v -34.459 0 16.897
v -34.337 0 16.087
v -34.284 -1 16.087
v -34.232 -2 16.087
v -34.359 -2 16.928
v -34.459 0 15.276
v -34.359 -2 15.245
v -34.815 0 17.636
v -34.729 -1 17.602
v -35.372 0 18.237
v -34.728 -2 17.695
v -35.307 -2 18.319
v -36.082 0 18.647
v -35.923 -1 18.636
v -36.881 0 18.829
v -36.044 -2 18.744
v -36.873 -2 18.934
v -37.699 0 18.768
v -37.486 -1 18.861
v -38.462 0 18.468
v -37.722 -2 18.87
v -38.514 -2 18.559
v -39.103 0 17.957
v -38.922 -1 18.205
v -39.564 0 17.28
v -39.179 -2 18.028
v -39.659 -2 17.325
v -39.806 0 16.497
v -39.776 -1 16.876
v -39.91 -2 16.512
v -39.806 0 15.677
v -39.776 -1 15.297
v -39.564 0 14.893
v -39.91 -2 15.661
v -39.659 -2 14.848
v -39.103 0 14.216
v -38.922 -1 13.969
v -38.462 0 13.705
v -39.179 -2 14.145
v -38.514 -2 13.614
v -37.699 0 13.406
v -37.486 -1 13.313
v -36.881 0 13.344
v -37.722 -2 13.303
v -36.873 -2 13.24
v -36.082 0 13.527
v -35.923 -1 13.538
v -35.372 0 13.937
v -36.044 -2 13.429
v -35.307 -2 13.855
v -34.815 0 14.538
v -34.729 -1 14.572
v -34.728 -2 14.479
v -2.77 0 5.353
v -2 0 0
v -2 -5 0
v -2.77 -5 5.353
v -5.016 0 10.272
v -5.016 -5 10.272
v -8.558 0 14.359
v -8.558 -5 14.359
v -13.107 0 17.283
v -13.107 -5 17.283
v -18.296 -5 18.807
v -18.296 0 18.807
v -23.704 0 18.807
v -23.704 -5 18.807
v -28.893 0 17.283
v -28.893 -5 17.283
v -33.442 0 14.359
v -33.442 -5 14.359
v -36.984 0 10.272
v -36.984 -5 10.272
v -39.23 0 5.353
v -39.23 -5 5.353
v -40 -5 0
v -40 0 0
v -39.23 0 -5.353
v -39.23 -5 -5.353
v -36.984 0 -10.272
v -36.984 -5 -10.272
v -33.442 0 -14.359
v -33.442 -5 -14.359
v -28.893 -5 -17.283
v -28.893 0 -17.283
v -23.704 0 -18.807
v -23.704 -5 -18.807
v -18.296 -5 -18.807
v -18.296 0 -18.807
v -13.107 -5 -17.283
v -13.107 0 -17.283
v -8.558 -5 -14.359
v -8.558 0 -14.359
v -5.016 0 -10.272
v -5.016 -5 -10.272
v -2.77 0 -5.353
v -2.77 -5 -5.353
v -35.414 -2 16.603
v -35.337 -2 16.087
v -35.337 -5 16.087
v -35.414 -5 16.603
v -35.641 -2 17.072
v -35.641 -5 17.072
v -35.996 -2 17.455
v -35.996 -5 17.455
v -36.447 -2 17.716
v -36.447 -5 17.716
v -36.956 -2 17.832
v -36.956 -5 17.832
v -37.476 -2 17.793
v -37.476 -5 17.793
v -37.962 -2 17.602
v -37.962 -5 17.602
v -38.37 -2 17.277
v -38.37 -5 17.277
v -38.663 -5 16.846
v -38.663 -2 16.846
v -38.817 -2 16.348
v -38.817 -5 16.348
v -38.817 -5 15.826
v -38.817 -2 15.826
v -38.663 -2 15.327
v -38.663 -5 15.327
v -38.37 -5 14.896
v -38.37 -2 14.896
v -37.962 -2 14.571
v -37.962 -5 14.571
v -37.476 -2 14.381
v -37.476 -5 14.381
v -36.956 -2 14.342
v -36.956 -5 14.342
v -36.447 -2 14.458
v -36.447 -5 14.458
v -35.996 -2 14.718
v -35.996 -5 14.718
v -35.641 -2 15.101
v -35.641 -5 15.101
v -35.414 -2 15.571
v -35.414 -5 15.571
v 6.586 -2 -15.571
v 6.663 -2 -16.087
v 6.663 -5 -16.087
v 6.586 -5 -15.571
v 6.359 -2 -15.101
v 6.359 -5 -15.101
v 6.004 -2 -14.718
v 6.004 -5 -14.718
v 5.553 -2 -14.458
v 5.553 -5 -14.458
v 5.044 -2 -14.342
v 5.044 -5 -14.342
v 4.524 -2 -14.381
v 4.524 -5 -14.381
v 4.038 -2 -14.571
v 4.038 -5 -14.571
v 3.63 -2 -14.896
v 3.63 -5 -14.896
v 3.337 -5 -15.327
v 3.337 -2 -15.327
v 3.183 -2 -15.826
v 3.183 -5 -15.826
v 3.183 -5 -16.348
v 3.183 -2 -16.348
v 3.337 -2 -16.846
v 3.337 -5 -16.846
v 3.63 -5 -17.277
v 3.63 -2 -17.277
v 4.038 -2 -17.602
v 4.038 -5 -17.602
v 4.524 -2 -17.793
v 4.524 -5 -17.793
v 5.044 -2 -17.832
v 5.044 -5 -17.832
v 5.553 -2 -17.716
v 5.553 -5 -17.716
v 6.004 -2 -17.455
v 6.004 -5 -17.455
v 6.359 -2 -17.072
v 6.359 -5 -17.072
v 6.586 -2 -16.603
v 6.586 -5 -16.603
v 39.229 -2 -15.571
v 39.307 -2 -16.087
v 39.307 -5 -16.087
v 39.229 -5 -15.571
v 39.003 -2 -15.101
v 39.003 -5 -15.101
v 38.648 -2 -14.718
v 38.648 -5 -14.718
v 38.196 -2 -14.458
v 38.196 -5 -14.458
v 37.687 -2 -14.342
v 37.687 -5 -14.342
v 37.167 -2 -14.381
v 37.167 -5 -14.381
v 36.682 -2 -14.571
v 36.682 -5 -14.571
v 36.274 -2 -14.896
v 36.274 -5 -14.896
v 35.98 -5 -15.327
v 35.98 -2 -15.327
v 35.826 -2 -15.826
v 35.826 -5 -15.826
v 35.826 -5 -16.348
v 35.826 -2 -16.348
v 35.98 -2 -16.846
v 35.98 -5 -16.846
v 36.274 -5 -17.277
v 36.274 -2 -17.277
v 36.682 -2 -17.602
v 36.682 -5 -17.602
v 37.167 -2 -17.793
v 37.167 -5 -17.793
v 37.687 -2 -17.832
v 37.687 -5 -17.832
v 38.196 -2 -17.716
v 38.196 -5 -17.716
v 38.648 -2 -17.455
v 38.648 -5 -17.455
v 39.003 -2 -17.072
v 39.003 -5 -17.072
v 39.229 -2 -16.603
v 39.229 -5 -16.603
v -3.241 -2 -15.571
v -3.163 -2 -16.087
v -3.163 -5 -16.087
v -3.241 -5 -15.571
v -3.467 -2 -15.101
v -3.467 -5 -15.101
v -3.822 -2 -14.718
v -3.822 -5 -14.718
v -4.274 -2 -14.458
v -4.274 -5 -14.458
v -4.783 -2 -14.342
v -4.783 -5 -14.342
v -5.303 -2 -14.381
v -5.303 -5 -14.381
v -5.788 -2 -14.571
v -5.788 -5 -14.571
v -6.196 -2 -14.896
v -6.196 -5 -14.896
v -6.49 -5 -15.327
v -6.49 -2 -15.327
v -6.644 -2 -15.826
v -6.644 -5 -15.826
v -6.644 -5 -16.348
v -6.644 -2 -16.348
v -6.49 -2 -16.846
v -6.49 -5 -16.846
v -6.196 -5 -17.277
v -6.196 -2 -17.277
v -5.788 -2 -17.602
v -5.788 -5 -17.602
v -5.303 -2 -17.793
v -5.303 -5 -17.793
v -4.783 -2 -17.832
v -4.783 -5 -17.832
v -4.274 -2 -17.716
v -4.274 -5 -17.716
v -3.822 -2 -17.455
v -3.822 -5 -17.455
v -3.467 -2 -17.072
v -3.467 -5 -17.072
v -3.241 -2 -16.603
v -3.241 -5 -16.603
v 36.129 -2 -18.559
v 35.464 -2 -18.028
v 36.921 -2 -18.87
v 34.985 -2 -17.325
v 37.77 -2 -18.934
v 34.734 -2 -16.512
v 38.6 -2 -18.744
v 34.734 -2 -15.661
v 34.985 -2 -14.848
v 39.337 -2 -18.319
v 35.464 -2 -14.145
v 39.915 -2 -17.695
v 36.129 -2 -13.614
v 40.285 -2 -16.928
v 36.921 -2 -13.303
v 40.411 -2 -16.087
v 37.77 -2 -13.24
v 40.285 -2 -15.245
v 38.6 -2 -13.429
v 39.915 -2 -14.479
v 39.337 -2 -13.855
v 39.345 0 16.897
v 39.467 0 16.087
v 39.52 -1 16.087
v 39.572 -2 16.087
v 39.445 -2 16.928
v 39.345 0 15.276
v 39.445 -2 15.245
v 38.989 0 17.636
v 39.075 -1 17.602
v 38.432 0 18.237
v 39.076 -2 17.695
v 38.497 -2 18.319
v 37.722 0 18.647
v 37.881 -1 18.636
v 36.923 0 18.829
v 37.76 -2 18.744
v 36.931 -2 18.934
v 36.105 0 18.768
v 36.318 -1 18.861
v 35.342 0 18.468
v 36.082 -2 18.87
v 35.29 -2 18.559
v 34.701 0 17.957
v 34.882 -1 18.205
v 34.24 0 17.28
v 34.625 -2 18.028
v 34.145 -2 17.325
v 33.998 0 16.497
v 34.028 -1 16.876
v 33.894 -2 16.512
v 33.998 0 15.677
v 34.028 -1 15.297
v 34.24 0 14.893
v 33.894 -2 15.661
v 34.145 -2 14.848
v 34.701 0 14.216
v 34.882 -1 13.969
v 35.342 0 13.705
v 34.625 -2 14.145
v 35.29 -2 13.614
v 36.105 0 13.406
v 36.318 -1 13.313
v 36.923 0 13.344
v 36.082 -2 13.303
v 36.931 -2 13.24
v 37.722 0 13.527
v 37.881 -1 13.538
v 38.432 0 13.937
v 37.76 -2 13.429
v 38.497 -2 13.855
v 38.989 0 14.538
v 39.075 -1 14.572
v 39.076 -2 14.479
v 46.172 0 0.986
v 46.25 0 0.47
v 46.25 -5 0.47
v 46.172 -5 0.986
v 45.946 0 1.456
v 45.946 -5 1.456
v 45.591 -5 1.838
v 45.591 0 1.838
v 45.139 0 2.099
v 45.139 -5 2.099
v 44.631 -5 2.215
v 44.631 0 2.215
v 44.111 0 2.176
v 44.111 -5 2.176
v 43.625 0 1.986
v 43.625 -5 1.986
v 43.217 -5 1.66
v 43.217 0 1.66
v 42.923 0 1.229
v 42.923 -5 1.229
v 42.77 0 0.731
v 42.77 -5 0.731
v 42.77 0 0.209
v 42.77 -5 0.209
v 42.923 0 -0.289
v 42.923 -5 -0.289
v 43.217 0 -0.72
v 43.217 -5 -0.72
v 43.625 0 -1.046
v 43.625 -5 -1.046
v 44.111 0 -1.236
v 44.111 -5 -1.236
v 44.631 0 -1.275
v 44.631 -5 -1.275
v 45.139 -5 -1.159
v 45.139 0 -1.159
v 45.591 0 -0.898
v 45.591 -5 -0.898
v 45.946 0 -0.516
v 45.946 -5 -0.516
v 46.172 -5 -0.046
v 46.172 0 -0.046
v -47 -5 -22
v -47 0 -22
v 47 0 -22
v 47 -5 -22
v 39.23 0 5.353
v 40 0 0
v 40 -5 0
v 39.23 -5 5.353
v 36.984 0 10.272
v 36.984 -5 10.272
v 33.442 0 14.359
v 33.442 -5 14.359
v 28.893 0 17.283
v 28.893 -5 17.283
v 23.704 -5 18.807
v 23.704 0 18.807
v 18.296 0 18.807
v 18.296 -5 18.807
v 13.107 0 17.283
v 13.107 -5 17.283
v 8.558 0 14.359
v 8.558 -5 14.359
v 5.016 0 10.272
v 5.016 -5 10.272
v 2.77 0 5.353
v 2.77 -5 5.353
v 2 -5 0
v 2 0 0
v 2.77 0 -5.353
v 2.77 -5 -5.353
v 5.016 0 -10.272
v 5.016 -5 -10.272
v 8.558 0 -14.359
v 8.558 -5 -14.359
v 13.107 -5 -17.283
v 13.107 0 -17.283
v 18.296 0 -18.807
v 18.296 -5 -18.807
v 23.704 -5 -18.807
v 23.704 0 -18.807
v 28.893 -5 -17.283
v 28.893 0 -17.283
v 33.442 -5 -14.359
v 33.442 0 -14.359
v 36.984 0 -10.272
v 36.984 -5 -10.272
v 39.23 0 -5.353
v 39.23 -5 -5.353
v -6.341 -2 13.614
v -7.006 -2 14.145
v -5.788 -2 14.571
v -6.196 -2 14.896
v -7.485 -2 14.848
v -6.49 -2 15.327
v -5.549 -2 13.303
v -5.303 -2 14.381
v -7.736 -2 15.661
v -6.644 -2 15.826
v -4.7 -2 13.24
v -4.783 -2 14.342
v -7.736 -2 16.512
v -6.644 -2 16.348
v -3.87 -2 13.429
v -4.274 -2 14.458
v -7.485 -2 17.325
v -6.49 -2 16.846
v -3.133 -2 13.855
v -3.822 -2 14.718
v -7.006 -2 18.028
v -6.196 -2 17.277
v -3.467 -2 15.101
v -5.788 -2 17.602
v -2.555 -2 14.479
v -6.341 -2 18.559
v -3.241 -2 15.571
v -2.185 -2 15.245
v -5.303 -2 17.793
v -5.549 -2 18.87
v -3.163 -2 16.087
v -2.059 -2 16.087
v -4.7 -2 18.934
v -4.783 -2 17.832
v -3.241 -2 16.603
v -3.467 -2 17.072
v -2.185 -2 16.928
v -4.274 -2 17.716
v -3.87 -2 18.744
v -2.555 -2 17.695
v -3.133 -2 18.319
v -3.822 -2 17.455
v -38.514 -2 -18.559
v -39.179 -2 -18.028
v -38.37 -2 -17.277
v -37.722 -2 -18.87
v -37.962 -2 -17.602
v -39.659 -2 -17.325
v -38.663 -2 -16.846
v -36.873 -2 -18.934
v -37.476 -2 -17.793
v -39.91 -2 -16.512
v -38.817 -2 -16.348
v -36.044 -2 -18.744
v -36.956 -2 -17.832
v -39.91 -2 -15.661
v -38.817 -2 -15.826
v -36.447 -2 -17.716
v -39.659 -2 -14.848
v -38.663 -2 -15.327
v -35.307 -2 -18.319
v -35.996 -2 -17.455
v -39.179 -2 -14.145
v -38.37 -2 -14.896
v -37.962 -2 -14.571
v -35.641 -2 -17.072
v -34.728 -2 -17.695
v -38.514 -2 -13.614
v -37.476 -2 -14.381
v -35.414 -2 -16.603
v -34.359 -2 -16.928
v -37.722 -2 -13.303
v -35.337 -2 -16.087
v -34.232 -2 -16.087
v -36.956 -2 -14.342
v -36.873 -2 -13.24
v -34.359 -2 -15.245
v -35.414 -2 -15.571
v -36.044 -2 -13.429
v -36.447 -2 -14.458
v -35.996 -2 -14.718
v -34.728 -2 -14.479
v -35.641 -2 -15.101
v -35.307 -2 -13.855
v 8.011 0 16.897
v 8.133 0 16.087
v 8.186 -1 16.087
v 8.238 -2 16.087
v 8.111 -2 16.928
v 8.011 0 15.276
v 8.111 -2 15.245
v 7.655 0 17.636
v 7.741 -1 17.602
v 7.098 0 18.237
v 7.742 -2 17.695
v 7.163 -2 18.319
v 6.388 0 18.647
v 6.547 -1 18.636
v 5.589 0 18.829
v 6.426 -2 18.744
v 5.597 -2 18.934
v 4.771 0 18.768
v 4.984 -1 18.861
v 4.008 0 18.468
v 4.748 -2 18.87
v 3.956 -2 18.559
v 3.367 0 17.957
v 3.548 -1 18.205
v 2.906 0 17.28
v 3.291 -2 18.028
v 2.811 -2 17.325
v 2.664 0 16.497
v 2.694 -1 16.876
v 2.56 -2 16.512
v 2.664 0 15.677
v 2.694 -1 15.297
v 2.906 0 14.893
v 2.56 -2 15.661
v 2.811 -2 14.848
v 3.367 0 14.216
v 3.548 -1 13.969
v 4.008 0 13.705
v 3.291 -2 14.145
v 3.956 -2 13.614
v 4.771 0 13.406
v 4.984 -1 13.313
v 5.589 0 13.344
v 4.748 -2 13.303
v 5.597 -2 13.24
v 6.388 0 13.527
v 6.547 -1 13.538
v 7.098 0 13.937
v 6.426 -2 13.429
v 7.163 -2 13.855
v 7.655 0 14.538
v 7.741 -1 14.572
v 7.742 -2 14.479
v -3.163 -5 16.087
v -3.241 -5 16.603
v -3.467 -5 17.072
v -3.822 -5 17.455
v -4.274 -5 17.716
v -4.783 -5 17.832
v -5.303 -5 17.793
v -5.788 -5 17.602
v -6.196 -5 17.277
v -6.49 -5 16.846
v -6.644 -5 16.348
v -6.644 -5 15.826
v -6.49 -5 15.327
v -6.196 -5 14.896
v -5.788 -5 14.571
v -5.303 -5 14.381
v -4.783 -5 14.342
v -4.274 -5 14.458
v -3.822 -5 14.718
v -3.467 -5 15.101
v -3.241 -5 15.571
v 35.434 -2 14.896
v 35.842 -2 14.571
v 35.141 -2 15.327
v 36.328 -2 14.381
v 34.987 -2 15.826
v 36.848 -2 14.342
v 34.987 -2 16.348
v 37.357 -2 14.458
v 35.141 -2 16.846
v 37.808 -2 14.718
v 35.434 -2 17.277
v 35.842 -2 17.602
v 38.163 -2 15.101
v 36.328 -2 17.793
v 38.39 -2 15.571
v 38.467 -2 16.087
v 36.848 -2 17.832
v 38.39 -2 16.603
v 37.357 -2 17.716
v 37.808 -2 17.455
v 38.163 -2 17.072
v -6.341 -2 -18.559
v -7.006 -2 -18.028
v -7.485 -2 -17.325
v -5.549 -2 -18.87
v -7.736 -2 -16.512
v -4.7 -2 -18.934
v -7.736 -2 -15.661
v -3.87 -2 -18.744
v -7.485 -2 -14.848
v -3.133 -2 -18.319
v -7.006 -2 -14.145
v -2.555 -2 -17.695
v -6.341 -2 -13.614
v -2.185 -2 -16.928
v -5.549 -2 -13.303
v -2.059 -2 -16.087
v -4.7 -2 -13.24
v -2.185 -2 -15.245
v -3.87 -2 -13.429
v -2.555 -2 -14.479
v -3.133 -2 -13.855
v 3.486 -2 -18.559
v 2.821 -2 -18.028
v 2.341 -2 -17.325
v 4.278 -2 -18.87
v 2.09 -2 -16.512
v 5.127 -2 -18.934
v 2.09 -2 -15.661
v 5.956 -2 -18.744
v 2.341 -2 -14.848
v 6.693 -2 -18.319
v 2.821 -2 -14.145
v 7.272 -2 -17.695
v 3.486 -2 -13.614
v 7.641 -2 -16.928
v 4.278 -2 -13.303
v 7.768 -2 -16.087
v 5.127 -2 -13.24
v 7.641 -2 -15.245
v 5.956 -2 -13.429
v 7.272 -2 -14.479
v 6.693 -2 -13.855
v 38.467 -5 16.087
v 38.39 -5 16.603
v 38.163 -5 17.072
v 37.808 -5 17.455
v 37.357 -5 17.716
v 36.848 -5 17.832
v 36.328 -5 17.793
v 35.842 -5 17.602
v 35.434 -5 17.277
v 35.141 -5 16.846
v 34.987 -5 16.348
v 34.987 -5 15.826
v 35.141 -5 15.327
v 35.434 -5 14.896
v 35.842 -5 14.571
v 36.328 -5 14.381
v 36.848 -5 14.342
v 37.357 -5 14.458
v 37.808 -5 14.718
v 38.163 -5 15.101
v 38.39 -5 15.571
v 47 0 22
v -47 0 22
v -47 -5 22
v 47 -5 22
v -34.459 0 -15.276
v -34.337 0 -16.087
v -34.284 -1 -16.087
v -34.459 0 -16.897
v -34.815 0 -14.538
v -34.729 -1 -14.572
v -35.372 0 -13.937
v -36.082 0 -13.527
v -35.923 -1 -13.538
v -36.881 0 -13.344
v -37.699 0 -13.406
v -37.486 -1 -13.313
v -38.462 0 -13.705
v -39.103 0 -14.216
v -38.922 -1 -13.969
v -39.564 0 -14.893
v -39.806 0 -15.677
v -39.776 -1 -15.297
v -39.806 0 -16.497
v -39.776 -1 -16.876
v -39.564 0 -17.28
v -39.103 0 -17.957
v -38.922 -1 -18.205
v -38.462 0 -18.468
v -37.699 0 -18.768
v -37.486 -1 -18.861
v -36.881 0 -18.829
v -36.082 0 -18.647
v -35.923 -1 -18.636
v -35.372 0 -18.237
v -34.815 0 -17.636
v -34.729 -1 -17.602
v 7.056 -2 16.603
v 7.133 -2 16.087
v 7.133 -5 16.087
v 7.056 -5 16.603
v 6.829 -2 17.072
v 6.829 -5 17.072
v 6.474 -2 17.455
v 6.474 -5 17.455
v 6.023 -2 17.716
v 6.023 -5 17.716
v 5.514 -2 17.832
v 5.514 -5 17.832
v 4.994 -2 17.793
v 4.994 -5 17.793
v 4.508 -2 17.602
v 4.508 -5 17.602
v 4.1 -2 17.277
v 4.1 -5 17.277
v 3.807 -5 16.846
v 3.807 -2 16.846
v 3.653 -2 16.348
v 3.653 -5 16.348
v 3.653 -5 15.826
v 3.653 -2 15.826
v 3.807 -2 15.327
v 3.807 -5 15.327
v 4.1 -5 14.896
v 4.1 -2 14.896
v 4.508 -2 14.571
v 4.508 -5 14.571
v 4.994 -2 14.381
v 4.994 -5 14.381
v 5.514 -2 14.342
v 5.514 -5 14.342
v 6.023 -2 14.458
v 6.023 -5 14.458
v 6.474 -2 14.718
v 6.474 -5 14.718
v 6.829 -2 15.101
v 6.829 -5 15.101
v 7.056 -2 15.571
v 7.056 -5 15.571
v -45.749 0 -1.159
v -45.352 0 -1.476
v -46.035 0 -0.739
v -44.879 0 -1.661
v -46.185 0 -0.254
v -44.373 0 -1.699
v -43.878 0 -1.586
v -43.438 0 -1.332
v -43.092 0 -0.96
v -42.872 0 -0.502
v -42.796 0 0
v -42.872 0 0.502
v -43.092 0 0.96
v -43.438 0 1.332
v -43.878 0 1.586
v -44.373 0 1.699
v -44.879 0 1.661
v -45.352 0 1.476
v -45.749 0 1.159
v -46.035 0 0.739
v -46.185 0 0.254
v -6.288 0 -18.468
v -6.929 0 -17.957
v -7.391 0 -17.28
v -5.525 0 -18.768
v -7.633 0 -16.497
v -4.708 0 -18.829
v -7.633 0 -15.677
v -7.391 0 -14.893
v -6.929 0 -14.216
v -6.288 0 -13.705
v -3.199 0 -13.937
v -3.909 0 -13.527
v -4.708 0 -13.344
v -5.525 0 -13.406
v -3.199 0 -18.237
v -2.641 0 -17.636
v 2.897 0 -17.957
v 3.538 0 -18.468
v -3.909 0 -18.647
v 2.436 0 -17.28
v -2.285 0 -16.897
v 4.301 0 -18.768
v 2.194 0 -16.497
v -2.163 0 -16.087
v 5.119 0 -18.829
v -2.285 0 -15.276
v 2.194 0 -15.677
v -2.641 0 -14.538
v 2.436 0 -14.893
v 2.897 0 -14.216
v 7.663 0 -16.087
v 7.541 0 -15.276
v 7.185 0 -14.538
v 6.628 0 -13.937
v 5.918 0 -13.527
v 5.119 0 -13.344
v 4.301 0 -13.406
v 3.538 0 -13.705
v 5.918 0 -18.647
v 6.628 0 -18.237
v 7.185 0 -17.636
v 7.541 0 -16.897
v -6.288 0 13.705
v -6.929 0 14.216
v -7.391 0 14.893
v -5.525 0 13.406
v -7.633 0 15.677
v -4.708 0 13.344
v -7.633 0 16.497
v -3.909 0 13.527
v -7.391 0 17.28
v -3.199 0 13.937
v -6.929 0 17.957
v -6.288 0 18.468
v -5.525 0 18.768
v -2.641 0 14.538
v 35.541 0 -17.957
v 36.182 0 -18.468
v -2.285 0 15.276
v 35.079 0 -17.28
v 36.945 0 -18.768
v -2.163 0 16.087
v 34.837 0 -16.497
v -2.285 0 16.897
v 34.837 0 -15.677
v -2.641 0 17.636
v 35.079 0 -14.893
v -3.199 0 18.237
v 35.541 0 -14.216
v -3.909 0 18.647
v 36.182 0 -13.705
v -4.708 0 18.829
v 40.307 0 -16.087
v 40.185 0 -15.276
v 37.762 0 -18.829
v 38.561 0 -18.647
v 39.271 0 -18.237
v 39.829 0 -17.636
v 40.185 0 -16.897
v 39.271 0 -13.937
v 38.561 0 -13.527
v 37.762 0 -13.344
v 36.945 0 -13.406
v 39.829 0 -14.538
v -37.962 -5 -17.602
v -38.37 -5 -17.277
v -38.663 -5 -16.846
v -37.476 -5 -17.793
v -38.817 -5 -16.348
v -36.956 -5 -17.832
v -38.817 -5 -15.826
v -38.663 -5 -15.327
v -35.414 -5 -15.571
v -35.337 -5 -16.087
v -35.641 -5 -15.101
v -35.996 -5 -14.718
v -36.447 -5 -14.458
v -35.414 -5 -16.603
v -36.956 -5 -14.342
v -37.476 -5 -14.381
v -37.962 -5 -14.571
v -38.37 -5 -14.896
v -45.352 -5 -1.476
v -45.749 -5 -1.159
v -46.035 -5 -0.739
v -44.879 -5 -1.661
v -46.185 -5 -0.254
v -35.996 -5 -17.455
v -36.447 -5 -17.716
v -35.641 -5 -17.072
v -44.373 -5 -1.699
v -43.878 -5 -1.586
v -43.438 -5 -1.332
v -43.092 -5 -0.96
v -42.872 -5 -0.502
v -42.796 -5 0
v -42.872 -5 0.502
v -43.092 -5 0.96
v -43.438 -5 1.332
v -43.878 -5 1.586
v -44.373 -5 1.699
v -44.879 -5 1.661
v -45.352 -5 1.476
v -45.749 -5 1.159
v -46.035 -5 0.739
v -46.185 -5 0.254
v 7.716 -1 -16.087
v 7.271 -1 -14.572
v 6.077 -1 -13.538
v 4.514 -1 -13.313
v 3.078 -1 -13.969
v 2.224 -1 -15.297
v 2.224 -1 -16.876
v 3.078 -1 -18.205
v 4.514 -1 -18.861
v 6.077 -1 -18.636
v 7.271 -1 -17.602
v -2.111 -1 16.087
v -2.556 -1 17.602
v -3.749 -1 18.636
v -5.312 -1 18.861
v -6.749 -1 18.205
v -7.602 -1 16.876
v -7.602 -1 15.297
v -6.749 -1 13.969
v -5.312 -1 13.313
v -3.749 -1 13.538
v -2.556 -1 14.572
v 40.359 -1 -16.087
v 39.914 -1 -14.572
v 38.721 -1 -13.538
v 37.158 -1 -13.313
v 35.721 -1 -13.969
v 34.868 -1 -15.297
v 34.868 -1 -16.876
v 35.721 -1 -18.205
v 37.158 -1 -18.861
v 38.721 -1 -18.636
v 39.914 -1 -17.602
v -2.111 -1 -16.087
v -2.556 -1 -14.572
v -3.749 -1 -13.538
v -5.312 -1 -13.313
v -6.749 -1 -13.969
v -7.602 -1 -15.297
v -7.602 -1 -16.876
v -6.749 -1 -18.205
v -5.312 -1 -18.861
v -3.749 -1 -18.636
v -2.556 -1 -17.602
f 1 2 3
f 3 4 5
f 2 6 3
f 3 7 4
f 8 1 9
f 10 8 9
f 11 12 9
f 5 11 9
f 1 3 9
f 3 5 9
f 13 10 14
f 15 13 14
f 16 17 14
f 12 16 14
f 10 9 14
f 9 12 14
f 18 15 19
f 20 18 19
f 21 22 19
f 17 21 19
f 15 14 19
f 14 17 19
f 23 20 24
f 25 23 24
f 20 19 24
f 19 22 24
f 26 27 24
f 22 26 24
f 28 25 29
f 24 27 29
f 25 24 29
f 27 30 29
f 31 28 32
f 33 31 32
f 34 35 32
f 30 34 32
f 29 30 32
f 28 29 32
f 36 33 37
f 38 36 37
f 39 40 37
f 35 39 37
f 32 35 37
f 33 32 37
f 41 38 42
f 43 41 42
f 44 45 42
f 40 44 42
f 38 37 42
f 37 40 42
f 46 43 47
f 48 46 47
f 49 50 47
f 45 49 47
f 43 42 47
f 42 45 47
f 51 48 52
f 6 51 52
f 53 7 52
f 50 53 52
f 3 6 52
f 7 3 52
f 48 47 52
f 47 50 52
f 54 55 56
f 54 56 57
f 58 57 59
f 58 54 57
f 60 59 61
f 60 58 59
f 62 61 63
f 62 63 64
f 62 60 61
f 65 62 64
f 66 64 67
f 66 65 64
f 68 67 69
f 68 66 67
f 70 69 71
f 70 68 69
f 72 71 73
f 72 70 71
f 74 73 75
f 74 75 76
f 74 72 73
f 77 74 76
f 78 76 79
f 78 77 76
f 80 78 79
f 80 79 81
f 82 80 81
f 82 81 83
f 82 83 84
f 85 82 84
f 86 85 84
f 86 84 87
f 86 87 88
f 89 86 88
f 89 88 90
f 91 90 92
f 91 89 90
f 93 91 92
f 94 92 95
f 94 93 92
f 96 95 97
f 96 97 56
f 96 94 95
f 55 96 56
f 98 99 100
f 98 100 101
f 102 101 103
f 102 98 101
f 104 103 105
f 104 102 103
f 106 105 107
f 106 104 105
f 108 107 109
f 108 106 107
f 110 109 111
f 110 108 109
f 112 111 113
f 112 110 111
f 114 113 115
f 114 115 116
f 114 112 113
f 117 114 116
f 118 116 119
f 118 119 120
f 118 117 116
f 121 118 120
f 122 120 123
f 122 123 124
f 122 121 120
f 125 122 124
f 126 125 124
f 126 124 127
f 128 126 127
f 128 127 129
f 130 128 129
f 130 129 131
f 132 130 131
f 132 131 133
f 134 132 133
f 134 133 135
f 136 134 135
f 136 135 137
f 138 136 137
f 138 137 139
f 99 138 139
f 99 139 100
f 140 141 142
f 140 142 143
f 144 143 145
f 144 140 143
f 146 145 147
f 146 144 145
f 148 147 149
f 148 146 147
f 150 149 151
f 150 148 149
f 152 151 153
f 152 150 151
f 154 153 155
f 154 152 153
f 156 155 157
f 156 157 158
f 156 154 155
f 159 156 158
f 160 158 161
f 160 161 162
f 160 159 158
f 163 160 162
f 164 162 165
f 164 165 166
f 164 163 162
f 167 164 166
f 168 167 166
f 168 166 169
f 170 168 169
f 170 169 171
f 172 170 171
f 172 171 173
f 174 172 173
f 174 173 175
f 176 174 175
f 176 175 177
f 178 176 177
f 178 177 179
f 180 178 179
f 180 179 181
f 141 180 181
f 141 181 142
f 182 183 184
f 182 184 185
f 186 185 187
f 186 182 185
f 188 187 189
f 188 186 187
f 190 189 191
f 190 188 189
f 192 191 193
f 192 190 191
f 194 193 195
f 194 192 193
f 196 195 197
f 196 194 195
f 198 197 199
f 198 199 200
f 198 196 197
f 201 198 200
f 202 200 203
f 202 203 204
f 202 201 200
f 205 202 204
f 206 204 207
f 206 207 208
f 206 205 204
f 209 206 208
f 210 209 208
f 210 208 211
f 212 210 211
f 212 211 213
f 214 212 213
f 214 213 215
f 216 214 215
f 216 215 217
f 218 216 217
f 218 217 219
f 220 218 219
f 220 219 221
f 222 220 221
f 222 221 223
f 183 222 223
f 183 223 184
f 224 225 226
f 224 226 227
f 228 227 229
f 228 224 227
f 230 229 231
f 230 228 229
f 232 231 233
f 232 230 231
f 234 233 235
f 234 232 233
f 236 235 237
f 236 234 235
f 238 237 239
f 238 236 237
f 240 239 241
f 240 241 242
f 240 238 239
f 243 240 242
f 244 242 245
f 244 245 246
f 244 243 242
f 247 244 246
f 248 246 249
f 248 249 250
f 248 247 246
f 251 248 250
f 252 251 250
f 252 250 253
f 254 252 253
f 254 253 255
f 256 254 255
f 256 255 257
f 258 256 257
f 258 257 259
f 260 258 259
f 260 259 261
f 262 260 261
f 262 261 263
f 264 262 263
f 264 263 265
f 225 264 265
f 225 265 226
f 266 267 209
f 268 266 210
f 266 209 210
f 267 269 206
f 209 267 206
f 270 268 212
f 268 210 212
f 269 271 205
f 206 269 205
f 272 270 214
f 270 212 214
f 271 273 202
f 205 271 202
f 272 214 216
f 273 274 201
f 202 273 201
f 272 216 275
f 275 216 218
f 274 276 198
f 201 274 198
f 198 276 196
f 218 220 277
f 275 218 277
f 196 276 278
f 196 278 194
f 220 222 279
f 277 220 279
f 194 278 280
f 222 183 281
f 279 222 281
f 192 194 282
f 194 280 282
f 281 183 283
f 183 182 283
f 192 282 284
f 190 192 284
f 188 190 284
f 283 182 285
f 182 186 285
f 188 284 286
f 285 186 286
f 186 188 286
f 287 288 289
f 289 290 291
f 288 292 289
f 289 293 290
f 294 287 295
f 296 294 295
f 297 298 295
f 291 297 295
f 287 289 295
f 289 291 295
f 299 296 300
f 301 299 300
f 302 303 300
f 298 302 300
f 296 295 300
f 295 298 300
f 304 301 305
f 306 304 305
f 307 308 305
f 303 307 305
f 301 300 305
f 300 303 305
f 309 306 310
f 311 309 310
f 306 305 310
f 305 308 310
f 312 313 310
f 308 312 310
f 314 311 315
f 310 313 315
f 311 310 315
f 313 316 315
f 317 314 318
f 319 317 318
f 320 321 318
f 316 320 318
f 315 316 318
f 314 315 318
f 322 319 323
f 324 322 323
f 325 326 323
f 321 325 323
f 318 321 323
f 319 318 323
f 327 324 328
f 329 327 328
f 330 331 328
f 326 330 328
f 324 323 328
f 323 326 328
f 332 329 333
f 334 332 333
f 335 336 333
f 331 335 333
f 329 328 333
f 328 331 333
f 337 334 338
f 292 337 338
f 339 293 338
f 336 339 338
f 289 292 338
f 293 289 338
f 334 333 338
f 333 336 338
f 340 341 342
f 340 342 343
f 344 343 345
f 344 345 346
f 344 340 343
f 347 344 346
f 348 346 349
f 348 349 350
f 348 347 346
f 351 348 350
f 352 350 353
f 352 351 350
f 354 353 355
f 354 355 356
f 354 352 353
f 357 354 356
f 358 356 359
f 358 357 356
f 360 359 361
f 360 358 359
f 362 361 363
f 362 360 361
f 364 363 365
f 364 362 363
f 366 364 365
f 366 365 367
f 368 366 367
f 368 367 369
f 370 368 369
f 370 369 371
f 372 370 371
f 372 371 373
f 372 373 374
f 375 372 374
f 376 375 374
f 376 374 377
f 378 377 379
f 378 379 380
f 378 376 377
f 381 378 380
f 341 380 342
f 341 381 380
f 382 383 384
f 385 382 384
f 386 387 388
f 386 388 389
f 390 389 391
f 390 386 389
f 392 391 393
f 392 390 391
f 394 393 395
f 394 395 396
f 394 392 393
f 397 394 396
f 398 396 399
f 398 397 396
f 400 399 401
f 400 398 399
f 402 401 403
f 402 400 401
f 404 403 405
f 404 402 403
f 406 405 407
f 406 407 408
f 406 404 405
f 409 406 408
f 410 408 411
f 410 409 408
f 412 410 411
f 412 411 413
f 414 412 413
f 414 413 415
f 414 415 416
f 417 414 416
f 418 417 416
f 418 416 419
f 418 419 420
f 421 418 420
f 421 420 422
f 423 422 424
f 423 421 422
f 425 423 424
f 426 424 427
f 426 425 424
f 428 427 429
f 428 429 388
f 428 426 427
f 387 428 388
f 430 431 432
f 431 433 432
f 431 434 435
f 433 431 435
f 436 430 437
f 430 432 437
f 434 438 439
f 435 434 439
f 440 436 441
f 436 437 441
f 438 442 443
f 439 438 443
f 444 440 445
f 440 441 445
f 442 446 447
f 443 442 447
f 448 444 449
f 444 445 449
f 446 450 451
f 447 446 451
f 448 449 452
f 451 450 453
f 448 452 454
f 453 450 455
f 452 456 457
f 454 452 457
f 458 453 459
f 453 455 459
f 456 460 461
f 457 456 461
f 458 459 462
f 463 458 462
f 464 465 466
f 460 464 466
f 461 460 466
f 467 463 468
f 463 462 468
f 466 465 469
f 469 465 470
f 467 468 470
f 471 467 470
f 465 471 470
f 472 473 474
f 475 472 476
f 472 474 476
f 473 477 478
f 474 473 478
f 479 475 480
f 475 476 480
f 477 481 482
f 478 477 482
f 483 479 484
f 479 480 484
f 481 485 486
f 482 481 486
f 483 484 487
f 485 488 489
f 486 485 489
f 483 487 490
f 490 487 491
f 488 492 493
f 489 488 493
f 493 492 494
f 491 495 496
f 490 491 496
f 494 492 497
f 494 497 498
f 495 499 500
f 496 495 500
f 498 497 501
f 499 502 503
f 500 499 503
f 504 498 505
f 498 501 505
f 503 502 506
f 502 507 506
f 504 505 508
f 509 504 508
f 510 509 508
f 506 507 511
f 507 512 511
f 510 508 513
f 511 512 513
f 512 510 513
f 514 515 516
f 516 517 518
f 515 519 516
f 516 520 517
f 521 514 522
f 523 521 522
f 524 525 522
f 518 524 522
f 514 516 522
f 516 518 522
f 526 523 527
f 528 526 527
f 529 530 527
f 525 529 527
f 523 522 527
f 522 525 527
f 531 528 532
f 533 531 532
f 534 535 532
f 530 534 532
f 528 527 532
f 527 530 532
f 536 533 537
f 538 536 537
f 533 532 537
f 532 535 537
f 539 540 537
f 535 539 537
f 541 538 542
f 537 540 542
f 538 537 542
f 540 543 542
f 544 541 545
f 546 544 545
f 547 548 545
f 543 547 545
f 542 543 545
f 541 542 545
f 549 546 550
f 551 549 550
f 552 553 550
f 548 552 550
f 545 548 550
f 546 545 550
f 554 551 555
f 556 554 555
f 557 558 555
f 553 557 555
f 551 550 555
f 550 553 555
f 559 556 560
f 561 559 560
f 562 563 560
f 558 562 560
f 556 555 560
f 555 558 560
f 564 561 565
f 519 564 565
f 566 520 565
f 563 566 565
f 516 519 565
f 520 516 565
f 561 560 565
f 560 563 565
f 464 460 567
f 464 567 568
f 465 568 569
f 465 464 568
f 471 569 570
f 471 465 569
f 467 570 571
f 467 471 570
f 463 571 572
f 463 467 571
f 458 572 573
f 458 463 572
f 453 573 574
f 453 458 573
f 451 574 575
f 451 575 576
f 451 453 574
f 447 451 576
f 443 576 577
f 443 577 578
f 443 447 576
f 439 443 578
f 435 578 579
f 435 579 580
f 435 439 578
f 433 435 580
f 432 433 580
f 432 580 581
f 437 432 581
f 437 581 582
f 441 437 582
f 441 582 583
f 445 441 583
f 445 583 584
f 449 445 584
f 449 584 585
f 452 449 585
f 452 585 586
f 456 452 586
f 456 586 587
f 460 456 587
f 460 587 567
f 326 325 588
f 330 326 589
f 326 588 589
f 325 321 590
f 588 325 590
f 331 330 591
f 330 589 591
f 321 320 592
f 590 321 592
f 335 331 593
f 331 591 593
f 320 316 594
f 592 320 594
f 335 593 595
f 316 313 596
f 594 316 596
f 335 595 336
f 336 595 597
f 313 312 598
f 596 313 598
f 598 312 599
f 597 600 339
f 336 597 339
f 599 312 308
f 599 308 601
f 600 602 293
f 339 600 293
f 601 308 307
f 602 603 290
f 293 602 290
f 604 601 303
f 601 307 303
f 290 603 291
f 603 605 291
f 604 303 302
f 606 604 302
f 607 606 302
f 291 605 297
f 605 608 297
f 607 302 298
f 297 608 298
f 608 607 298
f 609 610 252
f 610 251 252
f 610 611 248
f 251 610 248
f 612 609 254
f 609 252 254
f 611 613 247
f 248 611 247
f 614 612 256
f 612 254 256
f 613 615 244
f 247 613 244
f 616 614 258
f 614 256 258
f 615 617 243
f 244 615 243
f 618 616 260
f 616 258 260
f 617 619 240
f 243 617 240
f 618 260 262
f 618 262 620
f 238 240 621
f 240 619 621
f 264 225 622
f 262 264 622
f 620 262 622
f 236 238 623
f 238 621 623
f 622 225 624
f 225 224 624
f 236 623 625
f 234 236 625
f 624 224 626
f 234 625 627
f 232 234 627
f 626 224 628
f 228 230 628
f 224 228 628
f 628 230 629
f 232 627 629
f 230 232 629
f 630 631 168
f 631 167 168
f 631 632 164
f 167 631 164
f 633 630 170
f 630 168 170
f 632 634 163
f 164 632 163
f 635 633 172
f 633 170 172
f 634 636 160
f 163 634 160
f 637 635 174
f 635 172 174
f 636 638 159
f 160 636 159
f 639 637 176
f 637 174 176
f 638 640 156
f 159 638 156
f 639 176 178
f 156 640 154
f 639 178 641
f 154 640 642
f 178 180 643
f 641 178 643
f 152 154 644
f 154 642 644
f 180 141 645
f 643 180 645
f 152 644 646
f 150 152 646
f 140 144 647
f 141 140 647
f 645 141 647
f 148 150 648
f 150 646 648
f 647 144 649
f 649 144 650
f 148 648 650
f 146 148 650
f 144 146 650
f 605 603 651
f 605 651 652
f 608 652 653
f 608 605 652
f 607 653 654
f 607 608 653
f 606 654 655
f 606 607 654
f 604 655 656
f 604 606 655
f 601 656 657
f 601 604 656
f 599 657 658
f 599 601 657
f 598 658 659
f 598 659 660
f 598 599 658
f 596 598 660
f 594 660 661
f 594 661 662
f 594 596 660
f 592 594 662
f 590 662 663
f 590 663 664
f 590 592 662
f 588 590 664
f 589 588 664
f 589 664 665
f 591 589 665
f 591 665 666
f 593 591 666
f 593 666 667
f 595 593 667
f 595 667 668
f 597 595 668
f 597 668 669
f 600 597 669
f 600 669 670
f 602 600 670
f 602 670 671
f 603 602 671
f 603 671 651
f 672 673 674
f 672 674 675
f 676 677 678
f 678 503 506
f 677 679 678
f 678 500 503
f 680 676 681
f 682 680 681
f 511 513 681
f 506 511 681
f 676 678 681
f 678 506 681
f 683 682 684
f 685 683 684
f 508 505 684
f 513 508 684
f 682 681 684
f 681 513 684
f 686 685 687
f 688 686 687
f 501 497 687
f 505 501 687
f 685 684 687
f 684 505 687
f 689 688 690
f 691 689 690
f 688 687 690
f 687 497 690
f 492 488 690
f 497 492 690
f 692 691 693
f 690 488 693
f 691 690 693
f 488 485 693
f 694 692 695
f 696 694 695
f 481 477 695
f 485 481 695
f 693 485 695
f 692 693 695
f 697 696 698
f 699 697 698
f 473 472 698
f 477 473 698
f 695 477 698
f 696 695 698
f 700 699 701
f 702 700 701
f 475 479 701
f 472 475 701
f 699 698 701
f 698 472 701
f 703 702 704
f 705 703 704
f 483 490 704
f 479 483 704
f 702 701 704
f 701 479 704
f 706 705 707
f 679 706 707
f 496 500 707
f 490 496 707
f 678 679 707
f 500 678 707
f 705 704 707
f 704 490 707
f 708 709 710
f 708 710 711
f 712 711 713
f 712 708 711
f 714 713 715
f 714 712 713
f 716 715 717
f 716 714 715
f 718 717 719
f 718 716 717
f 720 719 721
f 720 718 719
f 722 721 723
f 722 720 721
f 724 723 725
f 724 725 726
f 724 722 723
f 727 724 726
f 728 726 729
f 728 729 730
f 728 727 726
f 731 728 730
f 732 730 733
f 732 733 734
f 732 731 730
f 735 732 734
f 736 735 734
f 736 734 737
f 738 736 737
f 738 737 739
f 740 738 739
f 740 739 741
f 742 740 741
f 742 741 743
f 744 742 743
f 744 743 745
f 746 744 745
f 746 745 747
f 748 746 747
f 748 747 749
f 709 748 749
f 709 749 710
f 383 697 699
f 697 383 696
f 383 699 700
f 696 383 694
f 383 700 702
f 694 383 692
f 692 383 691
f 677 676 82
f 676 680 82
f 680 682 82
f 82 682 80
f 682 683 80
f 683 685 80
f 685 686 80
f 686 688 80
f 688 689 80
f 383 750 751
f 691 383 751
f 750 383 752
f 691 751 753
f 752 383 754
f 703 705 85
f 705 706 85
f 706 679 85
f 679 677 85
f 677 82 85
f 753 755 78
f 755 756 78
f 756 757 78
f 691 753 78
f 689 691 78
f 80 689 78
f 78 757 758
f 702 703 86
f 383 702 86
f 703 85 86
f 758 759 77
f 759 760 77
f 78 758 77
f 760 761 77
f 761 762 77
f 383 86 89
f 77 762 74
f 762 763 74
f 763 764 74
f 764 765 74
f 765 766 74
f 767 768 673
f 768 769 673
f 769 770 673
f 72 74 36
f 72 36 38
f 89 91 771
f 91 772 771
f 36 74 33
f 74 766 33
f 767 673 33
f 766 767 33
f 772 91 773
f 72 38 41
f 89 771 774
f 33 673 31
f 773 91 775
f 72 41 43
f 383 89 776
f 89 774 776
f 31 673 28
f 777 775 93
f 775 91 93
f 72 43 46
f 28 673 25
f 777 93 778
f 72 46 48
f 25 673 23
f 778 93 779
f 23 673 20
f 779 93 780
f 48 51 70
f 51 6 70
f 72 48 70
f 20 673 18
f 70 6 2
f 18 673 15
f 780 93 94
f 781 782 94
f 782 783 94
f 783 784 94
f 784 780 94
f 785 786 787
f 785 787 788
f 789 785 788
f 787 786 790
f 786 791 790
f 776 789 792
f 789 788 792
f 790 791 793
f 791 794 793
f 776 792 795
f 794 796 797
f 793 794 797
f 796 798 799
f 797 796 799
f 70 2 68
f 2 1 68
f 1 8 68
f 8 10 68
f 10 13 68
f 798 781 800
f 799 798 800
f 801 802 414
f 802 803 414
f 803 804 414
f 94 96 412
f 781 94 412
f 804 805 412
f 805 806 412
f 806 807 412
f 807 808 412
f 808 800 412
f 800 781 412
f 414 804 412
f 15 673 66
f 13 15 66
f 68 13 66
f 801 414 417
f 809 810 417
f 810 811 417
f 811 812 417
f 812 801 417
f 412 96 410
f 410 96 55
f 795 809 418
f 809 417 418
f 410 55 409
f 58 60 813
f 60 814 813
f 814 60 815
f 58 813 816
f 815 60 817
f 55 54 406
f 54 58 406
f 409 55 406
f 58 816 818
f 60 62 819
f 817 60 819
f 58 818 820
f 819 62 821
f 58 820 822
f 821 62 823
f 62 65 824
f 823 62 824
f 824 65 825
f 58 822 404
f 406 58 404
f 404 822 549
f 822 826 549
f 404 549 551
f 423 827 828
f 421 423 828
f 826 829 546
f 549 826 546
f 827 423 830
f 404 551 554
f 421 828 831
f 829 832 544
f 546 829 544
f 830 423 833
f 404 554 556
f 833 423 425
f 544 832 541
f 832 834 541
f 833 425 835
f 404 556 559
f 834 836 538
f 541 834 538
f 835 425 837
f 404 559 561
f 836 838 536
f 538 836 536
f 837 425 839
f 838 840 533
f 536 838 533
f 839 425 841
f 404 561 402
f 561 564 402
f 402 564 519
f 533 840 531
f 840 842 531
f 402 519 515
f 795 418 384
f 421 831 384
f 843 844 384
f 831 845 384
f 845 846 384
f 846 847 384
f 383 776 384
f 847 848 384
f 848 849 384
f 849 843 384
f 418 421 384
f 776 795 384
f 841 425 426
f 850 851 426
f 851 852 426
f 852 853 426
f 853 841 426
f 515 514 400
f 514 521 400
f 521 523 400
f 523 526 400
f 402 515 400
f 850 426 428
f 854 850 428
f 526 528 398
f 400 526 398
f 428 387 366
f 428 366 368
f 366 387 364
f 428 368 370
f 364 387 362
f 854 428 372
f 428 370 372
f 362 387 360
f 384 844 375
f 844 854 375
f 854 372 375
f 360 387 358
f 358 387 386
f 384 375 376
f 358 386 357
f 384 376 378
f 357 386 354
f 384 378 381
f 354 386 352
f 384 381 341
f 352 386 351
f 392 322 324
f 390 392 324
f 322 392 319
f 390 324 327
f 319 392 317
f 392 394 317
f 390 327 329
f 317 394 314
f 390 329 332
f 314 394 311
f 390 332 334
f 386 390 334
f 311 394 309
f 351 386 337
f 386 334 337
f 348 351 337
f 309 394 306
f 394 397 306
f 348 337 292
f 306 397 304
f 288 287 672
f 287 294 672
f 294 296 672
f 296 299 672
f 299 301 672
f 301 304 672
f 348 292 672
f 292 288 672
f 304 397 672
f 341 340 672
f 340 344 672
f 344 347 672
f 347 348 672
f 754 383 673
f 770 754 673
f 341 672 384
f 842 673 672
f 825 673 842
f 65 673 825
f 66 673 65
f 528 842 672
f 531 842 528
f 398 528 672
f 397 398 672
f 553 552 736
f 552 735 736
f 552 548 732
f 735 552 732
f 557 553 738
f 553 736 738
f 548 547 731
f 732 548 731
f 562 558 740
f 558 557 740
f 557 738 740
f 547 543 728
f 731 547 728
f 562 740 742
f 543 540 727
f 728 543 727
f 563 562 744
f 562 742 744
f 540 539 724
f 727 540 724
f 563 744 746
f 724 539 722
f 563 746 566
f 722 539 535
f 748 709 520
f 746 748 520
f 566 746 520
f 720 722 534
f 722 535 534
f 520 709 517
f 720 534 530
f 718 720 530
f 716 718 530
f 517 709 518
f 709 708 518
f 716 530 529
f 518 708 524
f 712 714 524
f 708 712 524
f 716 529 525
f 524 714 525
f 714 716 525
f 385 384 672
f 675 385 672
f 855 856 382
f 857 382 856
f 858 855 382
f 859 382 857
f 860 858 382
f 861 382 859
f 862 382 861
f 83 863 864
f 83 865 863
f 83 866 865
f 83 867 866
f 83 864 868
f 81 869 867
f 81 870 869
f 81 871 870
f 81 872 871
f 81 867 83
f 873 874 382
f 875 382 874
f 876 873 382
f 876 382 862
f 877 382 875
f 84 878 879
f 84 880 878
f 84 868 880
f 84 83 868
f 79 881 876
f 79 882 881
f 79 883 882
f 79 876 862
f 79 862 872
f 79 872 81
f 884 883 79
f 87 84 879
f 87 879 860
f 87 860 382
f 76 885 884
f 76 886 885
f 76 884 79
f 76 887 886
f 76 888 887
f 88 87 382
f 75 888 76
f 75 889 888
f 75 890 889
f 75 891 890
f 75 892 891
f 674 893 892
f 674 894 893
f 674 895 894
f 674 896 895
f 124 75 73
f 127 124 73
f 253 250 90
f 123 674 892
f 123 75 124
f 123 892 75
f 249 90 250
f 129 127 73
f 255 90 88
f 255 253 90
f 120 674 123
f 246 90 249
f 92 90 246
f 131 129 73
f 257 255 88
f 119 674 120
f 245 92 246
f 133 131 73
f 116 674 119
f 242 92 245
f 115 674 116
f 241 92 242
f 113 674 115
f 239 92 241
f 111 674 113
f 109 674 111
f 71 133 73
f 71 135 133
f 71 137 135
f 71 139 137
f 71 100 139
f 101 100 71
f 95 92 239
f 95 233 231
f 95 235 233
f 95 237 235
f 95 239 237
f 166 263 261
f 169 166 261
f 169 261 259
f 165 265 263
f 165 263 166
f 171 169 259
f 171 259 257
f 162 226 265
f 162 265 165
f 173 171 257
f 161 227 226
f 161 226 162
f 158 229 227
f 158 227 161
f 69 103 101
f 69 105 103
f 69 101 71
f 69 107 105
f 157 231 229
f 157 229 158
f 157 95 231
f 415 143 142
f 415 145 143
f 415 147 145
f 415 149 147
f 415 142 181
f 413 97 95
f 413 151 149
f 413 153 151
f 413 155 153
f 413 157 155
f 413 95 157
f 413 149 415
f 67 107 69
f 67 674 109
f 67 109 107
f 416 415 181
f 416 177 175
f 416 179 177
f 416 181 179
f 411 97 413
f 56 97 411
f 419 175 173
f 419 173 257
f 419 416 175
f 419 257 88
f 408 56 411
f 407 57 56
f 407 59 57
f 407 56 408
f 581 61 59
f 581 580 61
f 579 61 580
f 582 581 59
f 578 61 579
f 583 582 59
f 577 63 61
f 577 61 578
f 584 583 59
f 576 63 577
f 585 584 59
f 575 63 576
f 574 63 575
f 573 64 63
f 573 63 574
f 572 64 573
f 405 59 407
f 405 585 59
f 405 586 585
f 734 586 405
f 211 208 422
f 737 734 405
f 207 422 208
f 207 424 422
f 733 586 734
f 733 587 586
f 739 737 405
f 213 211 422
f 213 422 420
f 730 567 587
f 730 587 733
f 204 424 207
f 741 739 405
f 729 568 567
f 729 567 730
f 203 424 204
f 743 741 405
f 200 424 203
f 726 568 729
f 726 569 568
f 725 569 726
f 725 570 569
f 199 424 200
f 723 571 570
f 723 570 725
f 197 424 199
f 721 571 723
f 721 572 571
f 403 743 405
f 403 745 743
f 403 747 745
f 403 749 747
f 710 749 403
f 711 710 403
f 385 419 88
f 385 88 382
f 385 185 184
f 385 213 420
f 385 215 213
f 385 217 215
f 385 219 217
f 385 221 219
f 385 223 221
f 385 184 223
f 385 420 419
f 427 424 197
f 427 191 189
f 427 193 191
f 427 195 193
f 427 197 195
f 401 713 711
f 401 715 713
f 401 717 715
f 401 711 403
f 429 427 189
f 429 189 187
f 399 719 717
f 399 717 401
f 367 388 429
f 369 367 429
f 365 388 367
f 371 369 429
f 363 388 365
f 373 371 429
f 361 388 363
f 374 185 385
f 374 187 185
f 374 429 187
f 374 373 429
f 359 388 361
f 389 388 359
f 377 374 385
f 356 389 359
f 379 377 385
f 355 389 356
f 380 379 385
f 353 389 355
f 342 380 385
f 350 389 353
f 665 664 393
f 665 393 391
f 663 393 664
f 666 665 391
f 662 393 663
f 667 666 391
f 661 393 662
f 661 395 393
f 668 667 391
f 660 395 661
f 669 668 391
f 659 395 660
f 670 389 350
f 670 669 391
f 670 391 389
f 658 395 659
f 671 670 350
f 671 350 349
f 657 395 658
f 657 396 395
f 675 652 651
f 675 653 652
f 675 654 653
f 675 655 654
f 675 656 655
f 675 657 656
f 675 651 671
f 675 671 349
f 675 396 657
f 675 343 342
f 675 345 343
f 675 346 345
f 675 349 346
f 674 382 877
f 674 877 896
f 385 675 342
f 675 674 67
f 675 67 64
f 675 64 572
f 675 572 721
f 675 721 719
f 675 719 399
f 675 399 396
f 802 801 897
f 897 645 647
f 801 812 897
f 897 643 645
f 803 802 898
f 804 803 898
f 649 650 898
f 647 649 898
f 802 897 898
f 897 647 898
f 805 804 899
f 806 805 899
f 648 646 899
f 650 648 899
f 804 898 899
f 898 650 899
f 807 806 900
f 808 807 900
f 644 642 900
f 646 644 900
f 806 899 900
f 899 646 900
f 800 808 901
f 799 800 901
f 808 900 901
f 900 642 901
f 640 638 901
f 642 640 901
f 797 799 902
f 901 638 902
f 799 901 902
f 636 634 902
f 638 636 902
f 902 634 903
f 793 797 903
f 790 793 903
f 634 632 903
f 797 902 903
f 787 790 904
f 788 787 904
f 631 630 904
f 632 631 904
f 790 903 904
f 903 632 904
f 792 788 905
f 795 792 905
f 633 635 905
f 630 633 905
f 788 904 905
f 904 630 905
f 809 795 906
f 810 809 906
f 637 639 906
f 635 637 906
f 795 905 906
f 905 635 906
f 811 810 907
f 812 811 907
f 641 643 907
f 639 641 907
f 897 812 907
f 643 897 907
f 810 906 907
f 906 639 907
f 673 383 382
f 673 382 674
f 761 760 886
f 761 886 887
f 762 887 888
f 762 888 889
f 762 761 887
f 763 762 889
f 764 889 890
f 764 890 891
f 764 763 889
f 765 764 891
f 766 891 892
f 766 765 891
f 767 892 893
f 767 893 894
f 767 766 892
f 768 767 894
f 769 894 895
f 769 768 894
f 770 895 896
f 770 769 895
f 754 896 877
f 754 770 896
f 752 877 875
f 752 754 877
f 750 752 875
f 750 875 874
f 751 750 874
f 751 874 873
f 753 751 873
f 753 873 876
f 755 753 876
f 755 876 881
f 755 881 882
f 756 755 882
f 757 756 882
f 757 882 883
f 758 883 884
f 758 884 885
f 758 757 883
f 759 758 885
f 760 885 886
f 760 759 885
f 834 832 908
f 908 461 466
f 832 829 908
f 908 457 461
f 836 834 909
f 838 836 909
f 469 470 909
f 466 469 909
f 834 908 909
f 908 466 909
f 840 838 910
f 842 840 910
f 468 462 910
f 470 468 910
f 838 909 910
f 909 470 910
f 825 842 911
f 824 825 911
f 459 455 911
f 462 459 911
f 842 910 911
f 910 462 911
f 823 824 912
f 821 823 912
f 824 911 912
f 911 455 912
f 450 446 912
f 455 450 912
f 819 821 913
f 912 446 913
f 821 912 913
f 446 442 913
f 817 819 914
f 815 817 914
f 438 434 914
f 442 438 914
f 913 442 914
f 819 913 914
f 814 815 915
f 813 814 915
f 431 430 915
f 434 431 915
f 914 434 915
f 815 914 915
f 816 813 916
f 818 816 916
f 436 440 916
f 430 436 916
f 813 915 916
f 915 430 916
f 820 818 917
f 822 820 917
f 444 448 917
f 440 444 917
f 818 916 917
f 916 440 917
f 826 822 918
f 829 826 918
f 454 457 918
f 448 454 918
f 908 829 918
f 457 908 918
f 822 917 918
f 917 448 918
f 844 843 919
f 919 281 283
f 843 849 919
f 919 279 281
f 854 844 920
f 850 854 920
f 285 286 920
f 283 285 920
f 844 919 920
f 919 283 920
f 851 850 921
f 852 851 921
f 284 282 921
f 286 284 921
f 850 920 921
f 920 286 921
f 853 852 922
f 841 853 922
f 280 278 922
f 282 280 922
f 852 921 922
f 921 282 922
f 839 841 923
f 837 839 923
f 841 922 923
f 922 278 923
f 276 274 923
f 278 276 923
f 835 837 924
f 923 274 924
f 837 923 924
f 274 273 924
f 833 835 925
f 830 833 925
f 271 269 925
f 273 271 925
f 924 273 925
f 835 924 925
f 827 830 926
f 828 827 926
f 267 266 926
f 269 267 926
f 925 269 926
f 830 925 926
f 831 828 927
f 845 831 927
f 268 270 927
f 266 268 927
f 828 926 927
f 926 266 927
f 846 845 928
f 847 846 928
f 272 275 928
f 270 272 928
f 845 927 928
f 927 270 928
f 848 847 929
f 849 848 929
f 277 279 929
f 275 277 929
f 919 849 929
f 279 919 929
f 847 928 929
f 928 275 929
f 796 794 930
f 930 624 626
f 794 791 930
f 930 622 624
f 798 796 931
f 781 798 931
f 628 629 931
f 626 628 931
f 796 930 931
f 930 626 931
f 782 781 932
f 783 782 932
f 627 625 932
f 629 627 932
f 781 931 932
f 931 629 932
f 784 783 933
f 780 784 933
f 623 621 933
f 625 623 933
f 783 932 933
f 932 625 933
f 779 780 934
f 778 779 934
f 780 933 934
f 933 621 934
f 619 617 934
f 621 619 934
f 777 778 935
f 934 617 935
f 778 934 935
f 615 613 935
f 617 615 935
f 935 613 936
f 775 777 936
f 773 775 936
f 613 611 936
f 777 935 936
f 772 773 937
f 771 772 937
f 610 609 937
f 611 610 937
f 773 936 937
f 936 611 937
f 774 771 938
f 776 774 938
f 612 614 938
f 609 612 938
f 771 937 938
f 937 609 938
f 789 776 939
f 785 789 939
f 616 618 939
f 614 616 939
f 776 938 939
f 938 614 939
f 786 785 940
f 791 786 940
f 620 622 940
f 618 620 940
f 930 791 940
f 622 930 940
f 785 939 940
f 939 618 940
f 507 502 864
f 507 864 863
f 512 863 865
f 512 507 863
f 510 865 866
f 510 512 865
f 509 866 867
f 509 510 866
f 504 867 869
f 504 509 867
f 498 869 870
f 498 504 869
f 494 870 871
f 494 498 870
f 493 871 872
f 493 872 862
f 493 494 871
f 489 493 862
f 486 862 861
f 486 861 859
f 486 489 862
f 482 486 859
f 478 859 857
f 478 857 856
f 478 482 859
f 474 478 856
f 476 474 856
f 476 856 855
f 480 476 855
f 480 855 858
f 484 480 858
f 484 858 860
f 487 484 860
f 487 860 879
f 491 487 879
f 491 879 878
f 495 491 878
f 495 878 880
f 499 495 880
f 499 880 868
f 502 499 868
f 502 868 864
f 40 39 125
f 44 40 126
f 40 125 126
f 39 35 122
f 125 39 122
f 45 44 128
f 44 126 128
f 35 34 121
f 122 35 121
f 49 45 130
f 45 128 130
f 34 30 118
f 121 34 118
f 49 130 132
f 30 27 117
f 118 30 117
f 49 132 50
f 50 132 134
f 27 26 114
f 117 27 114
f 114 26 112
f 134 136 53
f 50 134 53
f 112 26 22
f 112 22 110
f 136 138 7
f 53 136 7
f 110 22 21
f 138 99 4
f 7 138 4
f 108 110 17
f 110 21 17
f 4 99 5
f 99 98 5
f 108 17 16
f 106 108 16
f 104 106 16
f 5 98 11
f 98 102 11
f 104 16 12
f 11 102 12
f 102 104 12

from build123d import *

# Parameters (mm, degrees)
F0_W     = 94
F0_H     = 44
F0_R     = 2.75
F0_R_2   = 1.7038186653
F0_R_3   = 19
F0_R_4   = 1.75
F1_DEPTH = 5
F2_DEPTH = 2
F2_TAPER = -3


with BuildPart() as f1:
    # F0 (on Front) → F1 (new body)
    with BuildSketch(Plane.XZ):
        Rectangle(F0_W, F0_H)
        with Locations((-37.086679272, -16.086679272)):
            Circle(F0_R, mode=Mode.SUBTRACT)
        with Locations((-4.913320728, -16.086679272)):
            Circle(F0_R, mode=Mode.SUBTRACT)
        with Locations((4.913320728, -16.086679272)):
            Circle(F0_R, mode=Mode.SUBTRACT)
        with Locations((37.556679272, -16.086679272)):
            Circle(F0_R, mode=Mode.SUBTRACT)
        with Locations((-44.5, 0)):
            Circle(F0_R_2, mode=Mode.SUBTRACT)
        with Locations((-21, 0)):
            Circle(F0_R_3, mode=Mode.SUBTRACT)
        with Locations((-37.086679272, 16.086679272)):
            Circle(F0_R, mode=Mode.SUBTRACT)
        with Locations((-4.913320728, 16.086679272)):
            Circle(F0_R, mode=Mode.SUBTRACT)
        with Locations((21, 0)):
            Circle(F0_R_3, mode=Mode.SUBTRACT)
        with Locations((44.5, 0.47)):
            Circle(F0_R_4, mode=Mode.SUBTRACT)
        with Locations((5.383320728, 16.086679272)):
            Circle(F0_R, mode=Mode.SUBTRACT)
        with Locations((36.7173222003, 16.086679272)):
            Circle(F0_R, mode=Mode.SUBTRACT)
        with Locations((-37.086679272, 16.086679272)):
            Circle(F0_R)
        with Locations((-37.086679272, 16.086679272)):
            Circle(F0_R_4, mode=Mode.SUBTRACT)
        with Locations((-4.913320728, 16.086679272)):
            Circle(F0_R)
        with Locations((-4.913320728, 16.086679272)):
            Circle(F0_R_4, mode=Mode.SUBTRACT)
        with Locations((-37.086679272, -16.086679272)):
            Circle(F0_R)
        with Locations((-37.086679272, -16.086679272)):
            Circle(F0_R_4, mode=Mode.SUBTRACT)
        with Locations((-4.913320728, -16.086679272)):
            Circle(F0_R)
        with Locations((-4.913320728, -16.086679272)):
            Circle(F0_R_4, mode=Mode.SUBTRACT)
        with Locations((5.383320728, 16.086679272)):
            Circle(F0_R)
        with Locations((5.383320728, 16.086679272)):
            Circle(F0_R_4, mode=Mode.SUBTRACT)
        with Locations((36.7173222003, 16.086679272)):
            Circle(F0_R)
        with Locations((36.7173222003, 16.086679272)):
            Circle(F0_R_4, mode=Mode.SUBTRACT)
        with Locations((37.556679272, -16.086679272)):
            Circle(F0_R)
        with Locations((37.556679272, -16.086679272)):
            Circle(F0_R_4, mode=Mode.SUBTRACT)
        with Locations((4.913320728, -16.086679272)):
            Circle(F0_R)
        with Locations((4.913320728, -16.086679272)):
            Circle(F0_R_4, mode=Mode.SUBTRACT)
    extrude(amount=F1_DEPTH)

    # F0 (on Front) → F2 (cut)
    with BuildSketch(Plane.XZ):
        with Locations((-37.086679272, 16.086679272)):
            Circle(F0_R)
        with Locations((-37.086679272, 16.086679272)):
            Circle(F0_R_4, mode=Mode.SUBTRACT)
        with Locations((-37.086679272, -16.086679272)):
            Circle(F0_R)
        with Locations((-37.086679272, -16.086679272)):
            Circle(F0_R_4, mode=Mode.SUBTRACT)
        with Locations((-4.913320728, -16.086679272)):
            Circle(F0_R)
        with Locations((-4.913320728, -16.086679272)):
            Circle(F0_R_4, mode=Mode.SUBTRACT)
        with Locations((4.913320728, -16.086679272)):
            Circle(F0_R)
        with Locations((4.913320728, -16.086679272)):
            Circle(F0_R_4, mode=Mode.SUBTRACT)
        with Locations((37.556679272, -16.086679272)):
            Circle(F0_R)
        with Locations((37.556679272, -16.086679272)):
            Circle(F0_R_4, mode=Mode.SUBTRACT)
        with Locations((36.7173222003, 16.086679272)):
            Circle(F0_R)
        with Locations((36.7173222003, 16.086679272)):
            Circle(F0_R_4, mode=Mode.SUBTRACT)
        with Locations((5.383320728, 16.086679272)):
            Circle(F0_R)
        with Locations((5.383320728, 16.086679272)):
            Circle(F0_R_4, mode=Mode.SUBTRACT)
        with Locations((-4.913320728, 16.086679272)):
            Circle(F0_R)
        with Locations((-4.913320728, 16.086679272)):
            Circle(F0_R_4, mode=Mode.SUBTRACT)
    extrude(amount=F2_DEPTH, taper=F2_TAPER, mode=Mode.SUBTRACT)


solid = f1.part
